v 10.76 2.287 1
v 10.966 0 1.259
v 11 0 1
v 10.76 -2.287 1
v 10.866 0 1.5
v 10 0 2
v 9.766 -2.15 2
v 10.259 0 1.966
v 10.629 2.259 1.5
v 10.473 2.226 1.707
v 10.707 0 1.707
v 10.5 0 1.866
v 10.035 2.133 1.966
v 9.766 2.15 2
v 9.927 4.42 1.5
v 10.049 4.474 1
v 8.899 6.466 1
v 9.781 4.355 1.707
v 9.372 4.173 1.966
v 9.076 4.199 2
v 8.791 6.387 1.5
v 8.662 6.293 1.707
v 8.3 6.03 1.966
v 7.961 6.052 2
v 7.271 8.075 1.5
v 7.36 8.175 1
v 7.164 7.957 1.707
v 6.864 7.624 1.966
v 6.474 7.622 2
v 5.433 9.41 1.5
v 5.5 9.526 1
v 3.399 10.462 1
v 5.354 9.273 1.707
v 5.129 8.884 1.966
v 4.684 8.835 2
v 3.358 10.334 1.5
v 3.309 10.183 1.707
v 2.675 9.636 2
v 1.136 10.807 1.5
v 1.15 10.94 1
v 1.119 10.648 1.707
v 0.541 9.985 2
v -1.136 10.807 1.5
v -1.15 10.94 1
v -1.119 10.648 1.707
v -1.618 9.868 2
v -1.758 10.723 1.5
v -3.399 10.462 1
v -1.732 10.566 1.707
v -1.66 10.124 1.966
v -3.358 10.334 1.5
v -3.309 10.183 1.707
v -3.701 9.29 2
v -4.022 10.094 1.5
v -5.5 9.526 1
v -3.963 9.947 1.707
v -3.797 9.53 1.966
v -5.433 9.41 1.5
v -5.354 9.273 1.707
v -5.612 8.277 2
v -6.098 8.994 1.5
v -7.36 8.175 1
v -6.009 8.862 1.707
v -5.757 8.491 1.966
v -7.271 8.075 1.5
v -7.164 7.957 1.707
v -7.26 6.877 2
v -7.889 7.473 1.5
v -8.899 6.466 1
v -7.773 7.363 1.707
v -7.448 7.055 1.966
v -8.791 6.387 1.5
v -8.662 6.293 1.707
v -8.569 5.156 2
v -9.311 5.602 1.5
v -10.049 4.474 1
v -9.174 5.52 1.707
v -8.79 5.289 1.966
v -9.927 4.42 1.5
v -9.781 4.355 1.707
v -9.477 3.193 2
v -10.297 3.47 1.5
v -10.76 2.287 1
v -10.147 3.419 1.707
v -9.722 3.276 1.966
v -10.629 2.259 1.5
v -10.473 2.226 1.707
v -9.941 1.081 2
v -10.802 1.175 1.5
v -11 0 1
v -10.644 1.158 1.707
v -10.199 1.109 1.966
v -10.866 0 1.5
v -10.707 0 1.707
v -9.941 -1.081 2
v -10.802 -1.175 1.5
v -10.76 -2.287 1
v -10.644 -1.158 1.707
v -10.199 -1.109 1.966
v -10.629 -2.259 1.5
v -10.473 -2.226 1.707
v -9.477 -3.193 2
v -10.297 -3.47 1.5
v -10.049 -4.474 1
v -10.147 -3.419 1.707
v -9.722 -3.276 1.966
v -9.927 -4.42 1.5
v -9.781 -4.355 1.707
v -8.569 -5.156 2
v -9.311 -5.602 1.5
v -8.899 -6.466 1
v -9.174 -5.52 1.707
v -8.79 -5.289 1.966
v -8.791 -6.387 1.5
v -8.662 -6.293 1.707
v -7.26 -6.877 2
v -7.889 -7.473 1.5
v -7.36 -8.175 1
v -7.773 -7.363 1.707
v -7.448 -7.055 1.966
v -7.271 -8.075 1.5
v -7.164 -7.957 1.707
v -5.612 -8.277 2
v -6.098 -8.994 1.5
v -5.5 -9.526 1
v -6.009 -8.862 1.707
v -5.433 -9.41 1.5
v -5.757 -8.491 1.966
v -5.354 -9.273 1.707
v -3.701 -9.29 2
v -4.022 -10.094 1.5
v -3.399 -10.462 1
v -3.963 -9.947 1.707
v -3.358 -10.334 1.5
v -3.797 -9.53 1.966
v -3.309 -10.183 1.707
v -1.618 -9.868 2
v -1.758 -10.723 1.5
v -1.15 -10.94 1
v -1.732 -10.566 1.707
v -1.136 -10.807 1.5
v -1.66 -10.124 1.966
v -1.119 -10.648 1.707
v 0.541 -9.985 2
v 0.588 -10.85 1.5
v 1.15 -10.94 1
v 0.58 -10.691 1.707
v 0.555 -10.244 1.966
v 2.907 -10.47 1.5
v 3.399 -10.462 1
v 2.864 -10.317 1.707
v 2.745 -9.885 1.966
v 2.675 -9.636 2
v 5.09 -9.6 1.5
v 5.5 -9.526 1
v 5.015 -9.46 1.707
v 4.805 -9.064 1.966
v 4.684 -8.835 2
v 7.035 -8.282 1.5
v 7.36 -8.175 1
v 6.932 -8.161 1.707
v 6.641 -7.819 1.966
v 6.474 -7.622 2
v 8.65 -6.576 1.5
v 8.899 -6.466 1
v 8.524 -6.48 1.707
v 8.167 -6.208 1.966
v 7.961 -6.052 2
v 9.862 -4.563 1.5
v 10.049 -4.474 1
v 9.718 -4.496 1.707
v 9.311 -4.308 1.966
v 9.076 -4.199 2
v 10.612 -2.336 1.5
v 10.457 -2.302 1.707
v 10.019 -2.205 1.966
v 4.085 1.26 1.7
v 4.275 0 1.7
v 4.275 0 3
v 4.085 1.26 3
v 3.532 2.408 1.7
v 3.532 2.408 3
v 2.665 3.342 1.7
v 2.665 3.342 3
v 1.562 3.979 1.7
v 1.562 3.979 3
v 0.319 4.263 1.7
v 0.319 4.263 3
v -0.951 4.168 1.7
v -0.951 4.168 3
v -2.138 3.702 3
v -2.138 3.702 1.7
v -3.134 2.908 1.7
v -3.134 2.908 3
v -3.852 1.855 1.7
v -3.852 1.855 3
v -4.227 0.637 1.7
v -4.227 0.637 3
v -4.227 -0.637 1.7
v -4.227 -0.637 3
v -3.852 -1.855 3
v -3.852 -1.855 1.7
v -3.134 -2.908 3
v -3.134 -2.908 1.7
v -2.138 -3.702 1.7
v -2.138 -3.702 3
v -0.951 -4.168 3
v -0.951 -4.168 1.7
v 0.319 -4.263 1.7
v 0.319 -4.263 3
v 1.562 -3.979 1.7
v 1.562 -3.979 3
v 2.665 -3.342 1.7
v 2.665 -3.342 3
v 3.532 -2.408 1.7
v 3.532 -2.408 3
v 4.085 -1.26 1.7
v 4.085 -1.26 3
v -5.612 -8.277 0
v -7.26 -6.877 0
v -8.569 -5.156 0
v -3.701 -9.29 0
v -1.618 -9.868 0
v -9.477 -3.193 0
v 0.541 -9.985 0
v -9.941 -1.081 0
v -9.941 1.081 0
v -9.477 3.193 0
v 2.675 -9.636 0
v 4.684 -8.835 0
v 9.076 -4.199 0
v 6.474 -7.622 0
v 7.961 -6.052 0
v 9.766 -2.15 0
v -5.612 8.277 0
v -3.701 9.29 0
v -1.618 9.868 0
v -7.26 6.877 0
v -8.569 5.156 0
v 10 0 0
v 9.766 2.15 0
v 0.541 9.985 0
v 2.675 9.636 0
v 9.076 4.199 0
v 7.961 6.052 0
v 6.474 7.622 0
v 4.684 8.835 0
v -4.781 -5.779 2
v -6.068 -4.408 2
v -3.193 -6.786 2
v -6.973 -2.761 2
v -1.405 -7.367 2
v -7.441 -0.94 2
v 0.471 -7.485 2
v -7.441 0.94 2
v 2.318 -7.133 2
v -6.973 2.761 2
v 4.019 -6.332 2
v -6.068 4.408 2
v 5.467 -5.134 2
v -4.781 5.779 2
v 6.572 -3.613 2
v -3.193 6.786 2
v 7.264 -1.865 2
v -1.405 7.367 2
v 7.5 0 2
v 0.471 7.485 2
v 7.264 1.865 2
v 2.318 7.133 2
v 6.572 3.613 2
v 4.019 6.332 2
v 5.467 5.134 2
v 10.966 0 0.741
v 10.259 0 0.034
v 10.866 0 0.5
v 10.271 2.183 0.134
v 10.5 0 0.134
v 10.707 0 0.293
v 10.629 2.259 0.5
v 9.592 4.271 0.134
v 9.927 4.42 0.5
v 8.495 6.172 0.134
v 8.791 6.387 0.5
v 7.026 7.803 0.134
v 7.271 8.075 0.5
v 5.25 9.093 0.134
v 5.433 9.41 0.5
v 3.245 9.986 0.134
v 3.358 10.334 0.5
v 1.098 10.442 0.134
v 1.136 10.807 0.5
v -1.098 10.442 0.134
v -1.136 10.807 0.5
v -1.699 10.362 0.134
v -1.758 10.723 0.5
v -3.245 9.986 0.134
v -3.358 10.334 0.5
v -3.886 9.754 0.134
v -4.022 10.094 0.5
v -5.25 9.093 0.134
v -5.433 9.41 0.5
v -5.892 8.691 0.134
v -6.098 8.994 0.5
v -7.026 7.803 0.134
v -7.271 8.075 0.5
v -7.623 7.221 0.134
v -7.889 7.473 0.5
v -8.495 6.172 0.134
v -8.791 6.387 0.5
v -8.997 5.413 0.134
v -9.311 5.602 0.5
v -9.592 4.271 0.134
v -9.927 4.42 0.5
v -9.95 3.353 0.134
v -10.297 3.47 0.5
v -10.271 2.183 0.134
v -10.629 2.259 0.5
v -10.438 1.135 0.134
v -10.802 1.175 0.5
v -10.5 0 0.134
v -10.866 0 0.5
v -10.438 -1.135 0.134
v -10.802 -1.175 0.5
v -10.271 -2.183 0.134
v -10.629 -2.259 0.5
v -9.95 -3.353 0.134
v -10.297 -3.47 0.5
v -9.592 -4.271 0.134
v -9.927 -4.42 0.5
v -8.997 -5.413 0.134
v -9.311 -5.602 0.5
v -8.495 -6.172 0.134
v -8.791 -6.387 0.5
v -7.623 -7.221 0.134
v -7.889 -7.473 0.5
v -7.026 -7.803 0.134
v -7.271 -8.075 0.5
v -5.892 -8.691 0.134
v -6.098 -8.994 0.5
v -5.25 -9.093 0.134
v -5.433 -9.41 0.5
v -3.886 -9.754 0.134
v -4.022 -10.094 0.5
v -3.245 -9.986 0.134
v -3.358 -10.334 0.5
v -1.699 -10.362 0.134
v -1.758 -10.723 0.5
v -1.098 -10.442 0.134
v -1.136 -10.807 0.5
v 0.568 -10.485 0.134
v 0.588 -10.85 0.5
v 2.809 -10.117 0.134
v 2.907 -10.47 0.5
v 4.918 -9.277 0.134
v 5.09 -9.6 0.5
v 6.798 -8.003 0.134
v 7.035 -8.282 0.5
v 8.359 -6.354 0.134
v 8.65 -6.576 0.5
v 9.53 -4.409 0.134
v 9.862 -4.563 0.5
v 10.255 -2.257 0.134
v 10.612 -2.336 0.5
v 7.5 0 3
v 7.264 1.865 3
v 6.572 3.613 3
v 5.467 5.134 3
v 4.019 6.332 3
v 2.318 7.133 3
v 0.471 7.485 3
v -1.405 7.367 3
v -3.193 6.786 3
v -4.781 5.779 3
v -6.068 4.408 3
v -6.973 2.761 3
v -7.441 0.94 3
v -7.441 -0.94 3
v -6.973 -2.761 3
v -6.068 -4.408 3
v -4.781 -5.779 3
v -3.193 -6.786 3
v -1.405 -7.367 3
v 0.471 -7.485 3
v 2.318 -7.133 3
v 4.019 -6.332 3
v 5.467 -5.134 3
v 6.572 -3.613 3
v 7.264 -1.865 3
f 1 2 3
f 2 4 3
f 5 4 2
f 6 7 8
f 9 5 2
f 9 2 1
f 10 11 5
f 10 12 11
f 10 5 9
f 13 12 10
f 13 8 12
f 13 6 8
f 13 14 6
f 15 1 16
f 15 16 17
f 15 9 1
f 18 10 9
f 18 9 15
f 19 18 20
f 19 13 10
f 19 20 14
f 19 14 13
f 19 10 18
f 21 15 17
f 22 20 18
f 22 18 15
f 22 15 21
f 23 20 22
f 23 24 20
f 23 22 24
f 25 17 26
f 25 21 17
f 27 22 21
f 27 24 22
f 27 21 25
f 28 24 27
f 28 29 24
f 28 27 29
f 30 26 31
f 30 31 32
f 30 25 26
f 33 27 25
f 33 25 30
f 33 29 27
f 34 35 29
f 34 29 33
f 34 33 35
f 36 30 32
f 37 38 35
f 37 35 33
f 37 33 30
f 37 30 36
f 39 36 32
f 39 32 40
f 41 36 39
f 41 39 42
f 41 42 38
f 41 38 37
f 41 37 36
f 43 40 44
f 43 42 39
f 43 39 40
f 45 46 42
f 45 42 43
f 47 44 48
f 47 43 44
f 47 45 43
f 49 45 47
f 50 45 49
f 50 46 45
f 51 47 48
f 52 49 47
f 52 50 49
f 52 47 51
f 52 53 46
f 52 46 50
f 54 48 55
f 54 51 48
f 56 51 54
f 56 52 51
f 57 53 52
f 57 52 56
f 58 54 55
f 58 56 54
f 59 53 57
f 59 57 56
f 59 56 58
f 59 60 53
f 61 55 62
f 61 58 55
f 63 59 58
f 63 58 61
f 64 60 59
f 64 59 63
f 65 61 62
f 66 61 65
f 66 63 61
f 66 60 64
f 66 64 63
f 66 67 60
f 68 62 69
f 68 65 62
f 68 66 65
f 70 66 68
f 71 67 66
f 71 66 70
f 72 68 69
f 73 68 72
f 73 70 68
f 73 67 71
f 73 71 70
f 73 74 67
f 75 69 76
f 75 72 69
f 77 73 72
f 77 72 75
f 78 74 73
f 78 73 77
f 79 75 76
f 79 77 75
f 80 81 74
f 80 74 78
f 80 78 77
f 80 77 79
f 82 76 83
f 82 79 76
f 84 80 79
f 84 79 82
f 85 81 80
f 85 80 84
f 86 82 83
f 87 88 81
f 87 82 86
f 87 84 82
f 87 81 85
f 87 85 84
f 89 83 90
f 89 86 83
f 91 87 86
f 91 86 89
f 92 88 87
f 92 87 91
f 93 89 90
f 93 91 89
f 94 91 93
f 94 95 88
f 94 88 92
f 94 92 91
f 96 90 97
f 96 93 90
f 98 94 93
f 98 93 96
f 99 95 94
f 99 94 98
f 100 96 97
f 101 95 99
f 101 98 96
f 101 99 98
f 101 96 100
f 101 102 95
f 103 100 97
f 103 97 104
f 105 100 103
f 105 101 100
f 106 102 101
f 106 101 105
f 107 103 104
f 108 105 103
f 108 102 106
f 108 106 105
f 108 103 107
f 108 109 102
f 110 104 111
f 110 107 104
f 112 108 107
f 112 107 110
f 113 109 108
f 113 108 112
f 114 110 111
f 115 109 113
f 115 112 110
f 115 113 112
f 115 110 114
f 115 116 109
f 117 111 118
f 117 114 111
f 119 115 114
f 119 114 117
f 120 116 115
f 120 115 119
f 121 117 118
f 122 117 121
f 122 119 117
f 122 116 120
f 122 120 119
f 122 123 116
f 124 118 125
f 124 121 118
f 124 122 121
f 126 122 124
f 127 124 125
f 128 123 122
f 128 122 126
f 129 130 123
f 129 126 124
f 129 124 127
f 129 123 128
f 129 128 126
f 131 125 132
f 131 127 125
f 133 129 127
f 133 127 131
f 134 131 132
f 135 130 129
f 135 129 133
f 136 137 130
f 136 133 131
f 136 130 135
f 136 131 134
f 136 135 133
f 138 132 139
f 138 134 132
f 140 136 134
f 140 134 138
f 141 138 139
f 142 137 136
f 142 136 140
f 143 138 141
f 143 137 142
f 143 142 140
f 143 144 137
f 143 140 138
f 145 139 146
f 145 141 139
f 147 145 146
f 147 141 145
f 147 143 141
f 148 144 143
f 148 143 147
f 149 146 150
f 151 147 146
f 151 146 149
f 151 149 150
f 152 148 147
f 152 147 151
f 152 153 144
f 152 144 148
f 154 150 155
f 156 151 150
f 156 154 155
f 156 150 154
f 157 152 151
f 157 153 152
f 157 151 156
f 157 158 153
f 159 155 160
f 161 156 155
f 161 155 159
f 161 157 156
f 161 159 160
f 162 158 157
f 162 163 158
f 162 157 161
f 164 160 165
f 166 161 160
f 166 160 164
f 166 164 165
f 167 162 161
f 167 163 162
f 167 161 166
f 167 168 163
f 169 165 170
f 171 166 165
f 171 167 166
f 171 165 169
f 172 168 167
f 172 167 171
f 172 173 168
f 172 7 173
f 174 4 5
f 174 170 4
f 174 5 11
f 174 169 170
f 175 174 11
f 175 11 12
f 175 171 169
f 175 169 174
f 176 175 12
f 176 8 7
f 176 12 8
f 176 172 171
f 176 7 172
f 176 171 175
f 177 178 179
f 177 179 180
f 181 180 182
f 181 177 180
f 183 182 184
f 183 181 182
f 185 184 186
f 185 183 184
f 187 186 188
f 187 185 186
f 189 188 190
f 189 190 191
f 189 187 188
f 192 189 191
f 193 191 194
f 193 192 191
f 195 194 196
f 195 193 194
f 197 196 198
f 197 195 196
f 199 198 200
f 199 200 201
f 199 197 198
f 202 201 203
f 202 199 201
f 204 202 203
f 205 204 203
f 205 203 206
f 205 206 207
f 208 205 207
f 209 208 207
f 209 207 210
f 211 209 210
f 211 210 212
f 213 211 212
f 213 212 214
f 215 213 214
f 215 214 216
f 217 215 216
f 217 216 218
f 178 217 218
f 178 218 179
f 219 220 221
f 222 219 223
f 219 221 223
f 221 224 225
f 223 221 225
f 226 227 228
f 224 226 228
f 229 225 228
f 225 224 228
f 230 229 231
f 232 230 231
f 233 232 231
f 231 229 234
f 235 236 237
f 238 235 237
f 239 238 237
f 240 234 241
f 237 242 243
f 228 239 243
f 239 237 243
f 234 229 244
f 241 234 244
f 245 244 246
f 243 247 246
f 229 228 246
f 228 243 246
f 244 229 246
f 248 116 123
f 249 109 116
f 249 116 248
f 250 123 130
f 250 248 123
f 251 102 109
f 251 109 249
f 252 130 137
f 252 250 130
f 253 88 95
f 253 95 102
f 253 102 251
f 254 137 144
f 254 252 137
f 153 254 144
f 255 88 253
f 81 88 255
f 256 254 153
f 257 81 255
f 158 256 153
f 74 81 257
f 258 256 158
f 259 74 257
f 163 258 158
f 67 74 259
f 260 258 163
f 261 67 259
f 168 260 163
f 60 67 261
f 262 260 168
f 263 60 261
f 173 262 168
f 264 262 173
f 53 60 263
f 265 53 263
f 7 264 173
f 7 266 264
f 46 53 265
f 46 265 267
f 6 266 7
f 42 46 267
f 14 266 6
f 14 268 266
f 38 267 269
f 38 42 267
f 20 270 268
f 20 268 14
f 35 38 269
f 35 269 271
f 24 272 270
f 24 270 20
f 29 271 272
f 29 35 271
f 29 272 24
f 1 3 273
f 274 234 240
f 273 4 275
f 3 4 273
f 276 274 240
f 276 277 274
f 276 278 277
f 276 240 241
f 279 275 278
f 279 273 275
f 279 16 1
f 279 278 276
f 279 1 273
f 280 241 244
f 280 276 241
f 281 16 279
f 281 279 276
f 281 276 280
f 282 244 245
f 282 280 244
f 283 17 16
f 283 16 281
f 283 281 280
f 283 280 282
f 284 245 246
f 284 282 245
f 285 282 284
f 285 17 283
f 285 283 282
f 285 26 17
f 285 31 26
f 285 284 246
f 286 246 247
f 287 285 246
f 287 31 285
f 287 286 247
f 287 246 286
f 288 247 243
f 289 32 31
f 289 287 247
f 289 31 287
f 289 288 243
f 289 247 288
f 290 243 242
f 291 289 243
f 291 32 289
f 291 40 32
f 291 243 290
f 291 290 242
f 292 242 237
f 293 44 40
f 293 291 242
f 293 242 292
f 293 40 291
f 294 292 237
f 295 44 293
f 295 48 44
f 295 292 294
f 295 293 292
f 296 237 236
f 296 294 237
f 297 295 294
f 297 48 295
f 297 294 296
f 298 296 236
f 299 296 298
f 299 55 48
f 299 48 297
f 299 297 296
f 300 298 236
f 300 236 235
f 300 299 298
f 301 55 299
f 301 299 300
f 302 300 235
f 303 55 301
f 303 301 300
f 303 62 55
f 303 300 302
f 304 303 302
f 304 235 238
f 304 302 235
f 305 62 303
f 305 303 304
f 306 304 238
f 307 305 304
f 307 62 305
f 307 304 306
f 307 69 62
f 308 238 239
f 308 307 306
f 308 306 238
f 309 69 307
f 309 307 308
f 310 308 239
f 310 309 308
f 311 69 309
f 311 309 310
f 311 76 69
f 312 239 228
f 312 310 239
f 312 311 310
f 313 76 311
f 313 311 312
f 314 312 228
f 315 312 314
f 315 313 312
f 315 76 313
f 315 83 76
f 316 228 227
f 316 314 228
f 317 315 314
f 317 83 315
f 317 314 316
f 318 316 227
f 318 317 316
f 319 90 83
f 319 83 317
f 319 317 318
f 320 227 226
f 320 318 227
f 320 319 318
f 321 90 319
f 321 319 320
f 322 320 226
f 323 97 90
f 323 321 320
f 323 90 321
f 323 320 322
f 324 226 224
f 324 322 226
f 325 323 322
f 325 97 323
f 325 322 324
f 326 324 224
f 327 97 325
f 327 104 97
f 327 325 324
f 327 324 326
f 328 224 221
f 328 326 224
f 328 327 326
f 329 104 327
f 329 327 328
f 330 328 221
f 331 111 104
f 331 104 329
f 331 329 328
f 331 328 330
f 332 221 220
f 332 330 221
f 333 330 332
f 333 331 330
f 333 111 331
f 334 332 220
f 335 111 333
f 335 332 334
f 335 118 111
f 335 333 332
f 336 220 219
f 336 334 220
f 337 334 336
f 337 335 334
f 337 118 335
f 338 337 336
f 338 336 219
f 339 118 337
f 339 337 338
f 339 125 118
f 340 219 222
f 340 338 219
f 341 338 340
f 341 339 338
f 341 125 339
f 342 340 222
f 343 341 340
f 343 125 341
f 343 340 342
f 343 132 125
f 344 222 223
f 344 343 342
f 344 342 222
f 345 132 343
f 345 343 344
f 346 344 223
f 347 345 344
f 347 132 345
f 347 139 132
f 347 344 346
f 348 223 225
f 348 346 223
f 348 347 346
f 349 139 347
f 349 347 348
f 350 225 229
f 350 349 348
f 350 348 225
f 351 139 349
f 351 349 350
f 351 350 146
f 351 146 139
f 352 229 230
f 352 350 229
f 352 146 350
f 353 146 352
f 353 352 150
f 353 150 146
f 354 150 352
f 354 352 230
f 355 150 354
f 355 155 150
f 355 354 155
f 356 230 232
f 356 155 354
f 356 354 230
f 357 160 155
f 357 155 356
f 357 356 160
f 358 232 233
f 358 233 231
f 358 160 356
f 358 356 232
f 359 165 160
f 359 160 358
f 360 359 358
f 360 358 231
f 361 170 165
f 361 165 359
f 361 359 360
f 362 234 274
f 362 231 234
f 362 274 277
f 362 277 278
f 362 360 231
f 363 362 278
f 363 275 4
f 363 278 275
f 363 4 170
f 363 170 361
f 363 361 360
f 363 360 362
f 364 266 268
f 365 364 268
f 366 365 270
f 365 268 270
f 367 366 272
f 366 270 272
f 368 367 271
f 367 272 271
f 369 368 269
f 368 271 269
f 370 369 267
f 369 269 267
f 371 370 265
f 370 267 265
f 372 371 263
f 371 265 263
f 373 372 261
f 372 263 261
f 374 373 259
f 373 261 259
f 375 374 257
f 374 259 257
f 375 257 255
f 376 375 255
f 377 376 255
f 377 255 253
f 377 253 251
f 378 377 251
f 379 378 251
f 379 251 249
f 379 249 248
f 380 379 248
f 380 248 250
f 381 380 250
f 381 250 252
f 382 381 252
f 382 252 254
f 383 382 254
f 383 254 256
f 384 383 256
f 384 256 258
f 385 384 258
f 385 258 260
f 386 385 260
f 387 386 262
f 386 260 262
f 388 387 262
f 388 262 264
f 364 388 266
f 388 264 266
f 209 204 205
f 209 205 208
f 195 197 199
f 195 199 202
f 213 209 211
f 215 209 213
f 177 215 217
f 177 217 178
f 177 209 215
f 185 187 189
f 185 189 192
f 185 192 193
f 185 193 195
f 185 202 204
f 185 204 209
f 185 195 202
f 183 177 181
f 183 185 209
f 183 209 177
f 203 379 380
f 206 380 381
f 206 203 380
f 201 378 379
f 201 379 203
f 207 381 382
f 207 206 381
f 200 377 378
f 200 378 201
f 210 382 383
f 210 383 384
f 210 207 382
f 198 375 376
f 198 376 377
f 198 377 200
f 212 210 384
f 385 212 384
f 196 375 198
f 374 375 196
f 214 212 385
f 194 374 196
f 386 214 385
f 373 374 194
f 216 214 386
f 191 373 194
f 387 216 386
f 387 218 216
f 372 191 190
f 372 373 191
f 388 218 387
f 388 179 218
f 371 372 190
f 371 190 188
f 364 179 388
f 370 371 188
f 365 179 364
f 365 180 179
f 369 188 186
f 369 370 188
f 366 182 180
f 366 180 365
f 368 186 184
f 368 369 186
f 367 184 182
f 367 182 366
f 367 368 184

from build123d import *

# Parameters (mm, degrees)
F0_R     = 11
F0_R_2   = 7.5
F1_DEPTH = 2
F0_R_3   = 4.275
F2_DEPTH = 3
F3_DEPTH = 1.7
F4_R     = 0.99999


# Not quite as in the source:
# - a fillet or chamfer is up to 0.001 mm smaller than in the source, because OpenCascade refuses the exact size


with BuildPart() as f1:
    # F0 (on Top) → F1 (new body)
    with BuildSketch(Plane.XY):
        Circle(F0_R)
        Circle(F0_R_2, mode=Mode.SUBTRACT)
    extrude(amount=F1_DEPTH)

    # F0 (on Top) → F2 (join)
    with BuildSketch(Plane.XY):
        Circle(F0_R_2)
        Circle(F0_R_3, mode=Mode.SUBTRACT)
    extrude(amount=F2_DEPTH)

    # F0 (on Top) → F3 (join)
    with BuildSketch(Plane.XY):
        Circle(F0_R_3)
    extrude(amount=F3_DEPTH)

    # F4 (radius 1 in the source; OpenCascade refuses exactly that, so slightly less here)
    f4_edges = [f1.edges().sort_by_distance(p)[0] for p in [
        (-11, 0, 2),
        (-11, 0, 0),
    ]]
    fillet(f4_edges, radius=F4_R)


solid = f1.part
